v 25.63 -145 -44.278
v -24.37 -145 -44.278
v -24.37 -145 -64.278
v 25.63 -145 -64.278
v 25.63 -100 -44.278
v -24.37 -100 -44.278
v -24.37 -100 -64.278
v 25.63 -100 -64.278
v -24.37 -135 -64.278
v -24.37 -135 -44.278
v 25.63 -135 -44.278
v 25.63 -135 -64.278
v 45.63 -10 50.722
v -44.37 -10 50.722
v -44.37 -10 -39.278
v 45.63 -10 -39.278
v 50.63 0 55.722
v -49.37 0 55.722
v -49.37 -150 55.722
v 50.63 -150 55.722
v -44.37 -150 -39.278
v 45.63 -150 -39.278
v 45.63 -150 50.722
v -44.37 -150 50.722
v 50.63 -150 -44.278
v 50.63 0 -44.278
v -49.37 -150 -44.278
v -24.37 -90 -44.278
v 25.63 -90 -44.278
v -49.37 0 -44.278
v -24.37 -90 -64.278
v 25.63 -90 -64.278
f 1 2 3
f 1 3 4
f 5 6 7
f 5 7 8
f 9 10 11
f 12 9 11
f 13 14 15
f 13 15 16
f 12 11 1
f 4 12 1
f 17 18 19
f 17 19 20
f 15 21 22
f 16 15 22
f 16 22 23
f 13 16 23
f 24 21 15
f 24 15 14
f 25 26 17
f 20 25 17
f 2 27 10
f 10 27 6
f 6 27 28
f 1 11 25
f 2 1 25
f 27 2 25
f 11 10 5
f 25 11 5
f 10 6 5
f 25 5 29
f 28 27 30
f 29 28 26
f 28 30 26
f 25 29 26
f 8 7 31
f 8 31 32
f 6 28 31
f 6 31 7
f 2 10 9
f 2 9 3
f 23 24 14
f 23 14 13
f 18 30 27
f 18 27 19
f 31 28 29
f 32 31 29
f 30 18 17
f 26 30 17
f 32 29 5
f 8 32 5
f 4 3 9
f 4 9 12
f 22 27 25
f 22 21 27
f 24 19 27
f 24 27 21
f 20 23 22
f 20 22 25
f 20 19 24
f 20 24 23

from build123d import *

# Parameters (mm, degrees)
F0_W     = 100
F0_H     = 100
F1_DEPTH = 150
F2_W     = 90
F2_H     = 90
F3_DEPTH = 140
F4_W     = 50
F4_H     = 10
F5_DEPTH = 20


with BuildPart() as f1:
    # F0 (on Front) → F1 (new body)
    with BuildSketch(Plane.XZ):
        with Locations((0.630199, 5.721866)):
            Rectangle(F0_W, F0_H)
    extrude(amount=F1_DEPTH)

    # F2 (on face) → F3 (cut)
    with BuildSketch(Plane.XZ.offset(150)):
        with Locations((0.630199, 5.721866)):
            Rectangle(F2_W, F2_H)
    extrude(amount=-F3_DEPTH, mode=Mode.SUBTRACT)

    # F4 (on face) → F5 (join)
    with BuildSketch(Plane(origin=(0, 0, -44.278134), x_dir=(1, 0, 0), z_dir=(0, 0, -1))):
        with Locations((0.630199, 140)):
            Rectangle(F4_W, F4_H)
        with Locations((0.630199, 95)):
            Rectangle(F4_W, F4_H)
    extrude(amount=F5_DEPTH)


solid = f1.part
